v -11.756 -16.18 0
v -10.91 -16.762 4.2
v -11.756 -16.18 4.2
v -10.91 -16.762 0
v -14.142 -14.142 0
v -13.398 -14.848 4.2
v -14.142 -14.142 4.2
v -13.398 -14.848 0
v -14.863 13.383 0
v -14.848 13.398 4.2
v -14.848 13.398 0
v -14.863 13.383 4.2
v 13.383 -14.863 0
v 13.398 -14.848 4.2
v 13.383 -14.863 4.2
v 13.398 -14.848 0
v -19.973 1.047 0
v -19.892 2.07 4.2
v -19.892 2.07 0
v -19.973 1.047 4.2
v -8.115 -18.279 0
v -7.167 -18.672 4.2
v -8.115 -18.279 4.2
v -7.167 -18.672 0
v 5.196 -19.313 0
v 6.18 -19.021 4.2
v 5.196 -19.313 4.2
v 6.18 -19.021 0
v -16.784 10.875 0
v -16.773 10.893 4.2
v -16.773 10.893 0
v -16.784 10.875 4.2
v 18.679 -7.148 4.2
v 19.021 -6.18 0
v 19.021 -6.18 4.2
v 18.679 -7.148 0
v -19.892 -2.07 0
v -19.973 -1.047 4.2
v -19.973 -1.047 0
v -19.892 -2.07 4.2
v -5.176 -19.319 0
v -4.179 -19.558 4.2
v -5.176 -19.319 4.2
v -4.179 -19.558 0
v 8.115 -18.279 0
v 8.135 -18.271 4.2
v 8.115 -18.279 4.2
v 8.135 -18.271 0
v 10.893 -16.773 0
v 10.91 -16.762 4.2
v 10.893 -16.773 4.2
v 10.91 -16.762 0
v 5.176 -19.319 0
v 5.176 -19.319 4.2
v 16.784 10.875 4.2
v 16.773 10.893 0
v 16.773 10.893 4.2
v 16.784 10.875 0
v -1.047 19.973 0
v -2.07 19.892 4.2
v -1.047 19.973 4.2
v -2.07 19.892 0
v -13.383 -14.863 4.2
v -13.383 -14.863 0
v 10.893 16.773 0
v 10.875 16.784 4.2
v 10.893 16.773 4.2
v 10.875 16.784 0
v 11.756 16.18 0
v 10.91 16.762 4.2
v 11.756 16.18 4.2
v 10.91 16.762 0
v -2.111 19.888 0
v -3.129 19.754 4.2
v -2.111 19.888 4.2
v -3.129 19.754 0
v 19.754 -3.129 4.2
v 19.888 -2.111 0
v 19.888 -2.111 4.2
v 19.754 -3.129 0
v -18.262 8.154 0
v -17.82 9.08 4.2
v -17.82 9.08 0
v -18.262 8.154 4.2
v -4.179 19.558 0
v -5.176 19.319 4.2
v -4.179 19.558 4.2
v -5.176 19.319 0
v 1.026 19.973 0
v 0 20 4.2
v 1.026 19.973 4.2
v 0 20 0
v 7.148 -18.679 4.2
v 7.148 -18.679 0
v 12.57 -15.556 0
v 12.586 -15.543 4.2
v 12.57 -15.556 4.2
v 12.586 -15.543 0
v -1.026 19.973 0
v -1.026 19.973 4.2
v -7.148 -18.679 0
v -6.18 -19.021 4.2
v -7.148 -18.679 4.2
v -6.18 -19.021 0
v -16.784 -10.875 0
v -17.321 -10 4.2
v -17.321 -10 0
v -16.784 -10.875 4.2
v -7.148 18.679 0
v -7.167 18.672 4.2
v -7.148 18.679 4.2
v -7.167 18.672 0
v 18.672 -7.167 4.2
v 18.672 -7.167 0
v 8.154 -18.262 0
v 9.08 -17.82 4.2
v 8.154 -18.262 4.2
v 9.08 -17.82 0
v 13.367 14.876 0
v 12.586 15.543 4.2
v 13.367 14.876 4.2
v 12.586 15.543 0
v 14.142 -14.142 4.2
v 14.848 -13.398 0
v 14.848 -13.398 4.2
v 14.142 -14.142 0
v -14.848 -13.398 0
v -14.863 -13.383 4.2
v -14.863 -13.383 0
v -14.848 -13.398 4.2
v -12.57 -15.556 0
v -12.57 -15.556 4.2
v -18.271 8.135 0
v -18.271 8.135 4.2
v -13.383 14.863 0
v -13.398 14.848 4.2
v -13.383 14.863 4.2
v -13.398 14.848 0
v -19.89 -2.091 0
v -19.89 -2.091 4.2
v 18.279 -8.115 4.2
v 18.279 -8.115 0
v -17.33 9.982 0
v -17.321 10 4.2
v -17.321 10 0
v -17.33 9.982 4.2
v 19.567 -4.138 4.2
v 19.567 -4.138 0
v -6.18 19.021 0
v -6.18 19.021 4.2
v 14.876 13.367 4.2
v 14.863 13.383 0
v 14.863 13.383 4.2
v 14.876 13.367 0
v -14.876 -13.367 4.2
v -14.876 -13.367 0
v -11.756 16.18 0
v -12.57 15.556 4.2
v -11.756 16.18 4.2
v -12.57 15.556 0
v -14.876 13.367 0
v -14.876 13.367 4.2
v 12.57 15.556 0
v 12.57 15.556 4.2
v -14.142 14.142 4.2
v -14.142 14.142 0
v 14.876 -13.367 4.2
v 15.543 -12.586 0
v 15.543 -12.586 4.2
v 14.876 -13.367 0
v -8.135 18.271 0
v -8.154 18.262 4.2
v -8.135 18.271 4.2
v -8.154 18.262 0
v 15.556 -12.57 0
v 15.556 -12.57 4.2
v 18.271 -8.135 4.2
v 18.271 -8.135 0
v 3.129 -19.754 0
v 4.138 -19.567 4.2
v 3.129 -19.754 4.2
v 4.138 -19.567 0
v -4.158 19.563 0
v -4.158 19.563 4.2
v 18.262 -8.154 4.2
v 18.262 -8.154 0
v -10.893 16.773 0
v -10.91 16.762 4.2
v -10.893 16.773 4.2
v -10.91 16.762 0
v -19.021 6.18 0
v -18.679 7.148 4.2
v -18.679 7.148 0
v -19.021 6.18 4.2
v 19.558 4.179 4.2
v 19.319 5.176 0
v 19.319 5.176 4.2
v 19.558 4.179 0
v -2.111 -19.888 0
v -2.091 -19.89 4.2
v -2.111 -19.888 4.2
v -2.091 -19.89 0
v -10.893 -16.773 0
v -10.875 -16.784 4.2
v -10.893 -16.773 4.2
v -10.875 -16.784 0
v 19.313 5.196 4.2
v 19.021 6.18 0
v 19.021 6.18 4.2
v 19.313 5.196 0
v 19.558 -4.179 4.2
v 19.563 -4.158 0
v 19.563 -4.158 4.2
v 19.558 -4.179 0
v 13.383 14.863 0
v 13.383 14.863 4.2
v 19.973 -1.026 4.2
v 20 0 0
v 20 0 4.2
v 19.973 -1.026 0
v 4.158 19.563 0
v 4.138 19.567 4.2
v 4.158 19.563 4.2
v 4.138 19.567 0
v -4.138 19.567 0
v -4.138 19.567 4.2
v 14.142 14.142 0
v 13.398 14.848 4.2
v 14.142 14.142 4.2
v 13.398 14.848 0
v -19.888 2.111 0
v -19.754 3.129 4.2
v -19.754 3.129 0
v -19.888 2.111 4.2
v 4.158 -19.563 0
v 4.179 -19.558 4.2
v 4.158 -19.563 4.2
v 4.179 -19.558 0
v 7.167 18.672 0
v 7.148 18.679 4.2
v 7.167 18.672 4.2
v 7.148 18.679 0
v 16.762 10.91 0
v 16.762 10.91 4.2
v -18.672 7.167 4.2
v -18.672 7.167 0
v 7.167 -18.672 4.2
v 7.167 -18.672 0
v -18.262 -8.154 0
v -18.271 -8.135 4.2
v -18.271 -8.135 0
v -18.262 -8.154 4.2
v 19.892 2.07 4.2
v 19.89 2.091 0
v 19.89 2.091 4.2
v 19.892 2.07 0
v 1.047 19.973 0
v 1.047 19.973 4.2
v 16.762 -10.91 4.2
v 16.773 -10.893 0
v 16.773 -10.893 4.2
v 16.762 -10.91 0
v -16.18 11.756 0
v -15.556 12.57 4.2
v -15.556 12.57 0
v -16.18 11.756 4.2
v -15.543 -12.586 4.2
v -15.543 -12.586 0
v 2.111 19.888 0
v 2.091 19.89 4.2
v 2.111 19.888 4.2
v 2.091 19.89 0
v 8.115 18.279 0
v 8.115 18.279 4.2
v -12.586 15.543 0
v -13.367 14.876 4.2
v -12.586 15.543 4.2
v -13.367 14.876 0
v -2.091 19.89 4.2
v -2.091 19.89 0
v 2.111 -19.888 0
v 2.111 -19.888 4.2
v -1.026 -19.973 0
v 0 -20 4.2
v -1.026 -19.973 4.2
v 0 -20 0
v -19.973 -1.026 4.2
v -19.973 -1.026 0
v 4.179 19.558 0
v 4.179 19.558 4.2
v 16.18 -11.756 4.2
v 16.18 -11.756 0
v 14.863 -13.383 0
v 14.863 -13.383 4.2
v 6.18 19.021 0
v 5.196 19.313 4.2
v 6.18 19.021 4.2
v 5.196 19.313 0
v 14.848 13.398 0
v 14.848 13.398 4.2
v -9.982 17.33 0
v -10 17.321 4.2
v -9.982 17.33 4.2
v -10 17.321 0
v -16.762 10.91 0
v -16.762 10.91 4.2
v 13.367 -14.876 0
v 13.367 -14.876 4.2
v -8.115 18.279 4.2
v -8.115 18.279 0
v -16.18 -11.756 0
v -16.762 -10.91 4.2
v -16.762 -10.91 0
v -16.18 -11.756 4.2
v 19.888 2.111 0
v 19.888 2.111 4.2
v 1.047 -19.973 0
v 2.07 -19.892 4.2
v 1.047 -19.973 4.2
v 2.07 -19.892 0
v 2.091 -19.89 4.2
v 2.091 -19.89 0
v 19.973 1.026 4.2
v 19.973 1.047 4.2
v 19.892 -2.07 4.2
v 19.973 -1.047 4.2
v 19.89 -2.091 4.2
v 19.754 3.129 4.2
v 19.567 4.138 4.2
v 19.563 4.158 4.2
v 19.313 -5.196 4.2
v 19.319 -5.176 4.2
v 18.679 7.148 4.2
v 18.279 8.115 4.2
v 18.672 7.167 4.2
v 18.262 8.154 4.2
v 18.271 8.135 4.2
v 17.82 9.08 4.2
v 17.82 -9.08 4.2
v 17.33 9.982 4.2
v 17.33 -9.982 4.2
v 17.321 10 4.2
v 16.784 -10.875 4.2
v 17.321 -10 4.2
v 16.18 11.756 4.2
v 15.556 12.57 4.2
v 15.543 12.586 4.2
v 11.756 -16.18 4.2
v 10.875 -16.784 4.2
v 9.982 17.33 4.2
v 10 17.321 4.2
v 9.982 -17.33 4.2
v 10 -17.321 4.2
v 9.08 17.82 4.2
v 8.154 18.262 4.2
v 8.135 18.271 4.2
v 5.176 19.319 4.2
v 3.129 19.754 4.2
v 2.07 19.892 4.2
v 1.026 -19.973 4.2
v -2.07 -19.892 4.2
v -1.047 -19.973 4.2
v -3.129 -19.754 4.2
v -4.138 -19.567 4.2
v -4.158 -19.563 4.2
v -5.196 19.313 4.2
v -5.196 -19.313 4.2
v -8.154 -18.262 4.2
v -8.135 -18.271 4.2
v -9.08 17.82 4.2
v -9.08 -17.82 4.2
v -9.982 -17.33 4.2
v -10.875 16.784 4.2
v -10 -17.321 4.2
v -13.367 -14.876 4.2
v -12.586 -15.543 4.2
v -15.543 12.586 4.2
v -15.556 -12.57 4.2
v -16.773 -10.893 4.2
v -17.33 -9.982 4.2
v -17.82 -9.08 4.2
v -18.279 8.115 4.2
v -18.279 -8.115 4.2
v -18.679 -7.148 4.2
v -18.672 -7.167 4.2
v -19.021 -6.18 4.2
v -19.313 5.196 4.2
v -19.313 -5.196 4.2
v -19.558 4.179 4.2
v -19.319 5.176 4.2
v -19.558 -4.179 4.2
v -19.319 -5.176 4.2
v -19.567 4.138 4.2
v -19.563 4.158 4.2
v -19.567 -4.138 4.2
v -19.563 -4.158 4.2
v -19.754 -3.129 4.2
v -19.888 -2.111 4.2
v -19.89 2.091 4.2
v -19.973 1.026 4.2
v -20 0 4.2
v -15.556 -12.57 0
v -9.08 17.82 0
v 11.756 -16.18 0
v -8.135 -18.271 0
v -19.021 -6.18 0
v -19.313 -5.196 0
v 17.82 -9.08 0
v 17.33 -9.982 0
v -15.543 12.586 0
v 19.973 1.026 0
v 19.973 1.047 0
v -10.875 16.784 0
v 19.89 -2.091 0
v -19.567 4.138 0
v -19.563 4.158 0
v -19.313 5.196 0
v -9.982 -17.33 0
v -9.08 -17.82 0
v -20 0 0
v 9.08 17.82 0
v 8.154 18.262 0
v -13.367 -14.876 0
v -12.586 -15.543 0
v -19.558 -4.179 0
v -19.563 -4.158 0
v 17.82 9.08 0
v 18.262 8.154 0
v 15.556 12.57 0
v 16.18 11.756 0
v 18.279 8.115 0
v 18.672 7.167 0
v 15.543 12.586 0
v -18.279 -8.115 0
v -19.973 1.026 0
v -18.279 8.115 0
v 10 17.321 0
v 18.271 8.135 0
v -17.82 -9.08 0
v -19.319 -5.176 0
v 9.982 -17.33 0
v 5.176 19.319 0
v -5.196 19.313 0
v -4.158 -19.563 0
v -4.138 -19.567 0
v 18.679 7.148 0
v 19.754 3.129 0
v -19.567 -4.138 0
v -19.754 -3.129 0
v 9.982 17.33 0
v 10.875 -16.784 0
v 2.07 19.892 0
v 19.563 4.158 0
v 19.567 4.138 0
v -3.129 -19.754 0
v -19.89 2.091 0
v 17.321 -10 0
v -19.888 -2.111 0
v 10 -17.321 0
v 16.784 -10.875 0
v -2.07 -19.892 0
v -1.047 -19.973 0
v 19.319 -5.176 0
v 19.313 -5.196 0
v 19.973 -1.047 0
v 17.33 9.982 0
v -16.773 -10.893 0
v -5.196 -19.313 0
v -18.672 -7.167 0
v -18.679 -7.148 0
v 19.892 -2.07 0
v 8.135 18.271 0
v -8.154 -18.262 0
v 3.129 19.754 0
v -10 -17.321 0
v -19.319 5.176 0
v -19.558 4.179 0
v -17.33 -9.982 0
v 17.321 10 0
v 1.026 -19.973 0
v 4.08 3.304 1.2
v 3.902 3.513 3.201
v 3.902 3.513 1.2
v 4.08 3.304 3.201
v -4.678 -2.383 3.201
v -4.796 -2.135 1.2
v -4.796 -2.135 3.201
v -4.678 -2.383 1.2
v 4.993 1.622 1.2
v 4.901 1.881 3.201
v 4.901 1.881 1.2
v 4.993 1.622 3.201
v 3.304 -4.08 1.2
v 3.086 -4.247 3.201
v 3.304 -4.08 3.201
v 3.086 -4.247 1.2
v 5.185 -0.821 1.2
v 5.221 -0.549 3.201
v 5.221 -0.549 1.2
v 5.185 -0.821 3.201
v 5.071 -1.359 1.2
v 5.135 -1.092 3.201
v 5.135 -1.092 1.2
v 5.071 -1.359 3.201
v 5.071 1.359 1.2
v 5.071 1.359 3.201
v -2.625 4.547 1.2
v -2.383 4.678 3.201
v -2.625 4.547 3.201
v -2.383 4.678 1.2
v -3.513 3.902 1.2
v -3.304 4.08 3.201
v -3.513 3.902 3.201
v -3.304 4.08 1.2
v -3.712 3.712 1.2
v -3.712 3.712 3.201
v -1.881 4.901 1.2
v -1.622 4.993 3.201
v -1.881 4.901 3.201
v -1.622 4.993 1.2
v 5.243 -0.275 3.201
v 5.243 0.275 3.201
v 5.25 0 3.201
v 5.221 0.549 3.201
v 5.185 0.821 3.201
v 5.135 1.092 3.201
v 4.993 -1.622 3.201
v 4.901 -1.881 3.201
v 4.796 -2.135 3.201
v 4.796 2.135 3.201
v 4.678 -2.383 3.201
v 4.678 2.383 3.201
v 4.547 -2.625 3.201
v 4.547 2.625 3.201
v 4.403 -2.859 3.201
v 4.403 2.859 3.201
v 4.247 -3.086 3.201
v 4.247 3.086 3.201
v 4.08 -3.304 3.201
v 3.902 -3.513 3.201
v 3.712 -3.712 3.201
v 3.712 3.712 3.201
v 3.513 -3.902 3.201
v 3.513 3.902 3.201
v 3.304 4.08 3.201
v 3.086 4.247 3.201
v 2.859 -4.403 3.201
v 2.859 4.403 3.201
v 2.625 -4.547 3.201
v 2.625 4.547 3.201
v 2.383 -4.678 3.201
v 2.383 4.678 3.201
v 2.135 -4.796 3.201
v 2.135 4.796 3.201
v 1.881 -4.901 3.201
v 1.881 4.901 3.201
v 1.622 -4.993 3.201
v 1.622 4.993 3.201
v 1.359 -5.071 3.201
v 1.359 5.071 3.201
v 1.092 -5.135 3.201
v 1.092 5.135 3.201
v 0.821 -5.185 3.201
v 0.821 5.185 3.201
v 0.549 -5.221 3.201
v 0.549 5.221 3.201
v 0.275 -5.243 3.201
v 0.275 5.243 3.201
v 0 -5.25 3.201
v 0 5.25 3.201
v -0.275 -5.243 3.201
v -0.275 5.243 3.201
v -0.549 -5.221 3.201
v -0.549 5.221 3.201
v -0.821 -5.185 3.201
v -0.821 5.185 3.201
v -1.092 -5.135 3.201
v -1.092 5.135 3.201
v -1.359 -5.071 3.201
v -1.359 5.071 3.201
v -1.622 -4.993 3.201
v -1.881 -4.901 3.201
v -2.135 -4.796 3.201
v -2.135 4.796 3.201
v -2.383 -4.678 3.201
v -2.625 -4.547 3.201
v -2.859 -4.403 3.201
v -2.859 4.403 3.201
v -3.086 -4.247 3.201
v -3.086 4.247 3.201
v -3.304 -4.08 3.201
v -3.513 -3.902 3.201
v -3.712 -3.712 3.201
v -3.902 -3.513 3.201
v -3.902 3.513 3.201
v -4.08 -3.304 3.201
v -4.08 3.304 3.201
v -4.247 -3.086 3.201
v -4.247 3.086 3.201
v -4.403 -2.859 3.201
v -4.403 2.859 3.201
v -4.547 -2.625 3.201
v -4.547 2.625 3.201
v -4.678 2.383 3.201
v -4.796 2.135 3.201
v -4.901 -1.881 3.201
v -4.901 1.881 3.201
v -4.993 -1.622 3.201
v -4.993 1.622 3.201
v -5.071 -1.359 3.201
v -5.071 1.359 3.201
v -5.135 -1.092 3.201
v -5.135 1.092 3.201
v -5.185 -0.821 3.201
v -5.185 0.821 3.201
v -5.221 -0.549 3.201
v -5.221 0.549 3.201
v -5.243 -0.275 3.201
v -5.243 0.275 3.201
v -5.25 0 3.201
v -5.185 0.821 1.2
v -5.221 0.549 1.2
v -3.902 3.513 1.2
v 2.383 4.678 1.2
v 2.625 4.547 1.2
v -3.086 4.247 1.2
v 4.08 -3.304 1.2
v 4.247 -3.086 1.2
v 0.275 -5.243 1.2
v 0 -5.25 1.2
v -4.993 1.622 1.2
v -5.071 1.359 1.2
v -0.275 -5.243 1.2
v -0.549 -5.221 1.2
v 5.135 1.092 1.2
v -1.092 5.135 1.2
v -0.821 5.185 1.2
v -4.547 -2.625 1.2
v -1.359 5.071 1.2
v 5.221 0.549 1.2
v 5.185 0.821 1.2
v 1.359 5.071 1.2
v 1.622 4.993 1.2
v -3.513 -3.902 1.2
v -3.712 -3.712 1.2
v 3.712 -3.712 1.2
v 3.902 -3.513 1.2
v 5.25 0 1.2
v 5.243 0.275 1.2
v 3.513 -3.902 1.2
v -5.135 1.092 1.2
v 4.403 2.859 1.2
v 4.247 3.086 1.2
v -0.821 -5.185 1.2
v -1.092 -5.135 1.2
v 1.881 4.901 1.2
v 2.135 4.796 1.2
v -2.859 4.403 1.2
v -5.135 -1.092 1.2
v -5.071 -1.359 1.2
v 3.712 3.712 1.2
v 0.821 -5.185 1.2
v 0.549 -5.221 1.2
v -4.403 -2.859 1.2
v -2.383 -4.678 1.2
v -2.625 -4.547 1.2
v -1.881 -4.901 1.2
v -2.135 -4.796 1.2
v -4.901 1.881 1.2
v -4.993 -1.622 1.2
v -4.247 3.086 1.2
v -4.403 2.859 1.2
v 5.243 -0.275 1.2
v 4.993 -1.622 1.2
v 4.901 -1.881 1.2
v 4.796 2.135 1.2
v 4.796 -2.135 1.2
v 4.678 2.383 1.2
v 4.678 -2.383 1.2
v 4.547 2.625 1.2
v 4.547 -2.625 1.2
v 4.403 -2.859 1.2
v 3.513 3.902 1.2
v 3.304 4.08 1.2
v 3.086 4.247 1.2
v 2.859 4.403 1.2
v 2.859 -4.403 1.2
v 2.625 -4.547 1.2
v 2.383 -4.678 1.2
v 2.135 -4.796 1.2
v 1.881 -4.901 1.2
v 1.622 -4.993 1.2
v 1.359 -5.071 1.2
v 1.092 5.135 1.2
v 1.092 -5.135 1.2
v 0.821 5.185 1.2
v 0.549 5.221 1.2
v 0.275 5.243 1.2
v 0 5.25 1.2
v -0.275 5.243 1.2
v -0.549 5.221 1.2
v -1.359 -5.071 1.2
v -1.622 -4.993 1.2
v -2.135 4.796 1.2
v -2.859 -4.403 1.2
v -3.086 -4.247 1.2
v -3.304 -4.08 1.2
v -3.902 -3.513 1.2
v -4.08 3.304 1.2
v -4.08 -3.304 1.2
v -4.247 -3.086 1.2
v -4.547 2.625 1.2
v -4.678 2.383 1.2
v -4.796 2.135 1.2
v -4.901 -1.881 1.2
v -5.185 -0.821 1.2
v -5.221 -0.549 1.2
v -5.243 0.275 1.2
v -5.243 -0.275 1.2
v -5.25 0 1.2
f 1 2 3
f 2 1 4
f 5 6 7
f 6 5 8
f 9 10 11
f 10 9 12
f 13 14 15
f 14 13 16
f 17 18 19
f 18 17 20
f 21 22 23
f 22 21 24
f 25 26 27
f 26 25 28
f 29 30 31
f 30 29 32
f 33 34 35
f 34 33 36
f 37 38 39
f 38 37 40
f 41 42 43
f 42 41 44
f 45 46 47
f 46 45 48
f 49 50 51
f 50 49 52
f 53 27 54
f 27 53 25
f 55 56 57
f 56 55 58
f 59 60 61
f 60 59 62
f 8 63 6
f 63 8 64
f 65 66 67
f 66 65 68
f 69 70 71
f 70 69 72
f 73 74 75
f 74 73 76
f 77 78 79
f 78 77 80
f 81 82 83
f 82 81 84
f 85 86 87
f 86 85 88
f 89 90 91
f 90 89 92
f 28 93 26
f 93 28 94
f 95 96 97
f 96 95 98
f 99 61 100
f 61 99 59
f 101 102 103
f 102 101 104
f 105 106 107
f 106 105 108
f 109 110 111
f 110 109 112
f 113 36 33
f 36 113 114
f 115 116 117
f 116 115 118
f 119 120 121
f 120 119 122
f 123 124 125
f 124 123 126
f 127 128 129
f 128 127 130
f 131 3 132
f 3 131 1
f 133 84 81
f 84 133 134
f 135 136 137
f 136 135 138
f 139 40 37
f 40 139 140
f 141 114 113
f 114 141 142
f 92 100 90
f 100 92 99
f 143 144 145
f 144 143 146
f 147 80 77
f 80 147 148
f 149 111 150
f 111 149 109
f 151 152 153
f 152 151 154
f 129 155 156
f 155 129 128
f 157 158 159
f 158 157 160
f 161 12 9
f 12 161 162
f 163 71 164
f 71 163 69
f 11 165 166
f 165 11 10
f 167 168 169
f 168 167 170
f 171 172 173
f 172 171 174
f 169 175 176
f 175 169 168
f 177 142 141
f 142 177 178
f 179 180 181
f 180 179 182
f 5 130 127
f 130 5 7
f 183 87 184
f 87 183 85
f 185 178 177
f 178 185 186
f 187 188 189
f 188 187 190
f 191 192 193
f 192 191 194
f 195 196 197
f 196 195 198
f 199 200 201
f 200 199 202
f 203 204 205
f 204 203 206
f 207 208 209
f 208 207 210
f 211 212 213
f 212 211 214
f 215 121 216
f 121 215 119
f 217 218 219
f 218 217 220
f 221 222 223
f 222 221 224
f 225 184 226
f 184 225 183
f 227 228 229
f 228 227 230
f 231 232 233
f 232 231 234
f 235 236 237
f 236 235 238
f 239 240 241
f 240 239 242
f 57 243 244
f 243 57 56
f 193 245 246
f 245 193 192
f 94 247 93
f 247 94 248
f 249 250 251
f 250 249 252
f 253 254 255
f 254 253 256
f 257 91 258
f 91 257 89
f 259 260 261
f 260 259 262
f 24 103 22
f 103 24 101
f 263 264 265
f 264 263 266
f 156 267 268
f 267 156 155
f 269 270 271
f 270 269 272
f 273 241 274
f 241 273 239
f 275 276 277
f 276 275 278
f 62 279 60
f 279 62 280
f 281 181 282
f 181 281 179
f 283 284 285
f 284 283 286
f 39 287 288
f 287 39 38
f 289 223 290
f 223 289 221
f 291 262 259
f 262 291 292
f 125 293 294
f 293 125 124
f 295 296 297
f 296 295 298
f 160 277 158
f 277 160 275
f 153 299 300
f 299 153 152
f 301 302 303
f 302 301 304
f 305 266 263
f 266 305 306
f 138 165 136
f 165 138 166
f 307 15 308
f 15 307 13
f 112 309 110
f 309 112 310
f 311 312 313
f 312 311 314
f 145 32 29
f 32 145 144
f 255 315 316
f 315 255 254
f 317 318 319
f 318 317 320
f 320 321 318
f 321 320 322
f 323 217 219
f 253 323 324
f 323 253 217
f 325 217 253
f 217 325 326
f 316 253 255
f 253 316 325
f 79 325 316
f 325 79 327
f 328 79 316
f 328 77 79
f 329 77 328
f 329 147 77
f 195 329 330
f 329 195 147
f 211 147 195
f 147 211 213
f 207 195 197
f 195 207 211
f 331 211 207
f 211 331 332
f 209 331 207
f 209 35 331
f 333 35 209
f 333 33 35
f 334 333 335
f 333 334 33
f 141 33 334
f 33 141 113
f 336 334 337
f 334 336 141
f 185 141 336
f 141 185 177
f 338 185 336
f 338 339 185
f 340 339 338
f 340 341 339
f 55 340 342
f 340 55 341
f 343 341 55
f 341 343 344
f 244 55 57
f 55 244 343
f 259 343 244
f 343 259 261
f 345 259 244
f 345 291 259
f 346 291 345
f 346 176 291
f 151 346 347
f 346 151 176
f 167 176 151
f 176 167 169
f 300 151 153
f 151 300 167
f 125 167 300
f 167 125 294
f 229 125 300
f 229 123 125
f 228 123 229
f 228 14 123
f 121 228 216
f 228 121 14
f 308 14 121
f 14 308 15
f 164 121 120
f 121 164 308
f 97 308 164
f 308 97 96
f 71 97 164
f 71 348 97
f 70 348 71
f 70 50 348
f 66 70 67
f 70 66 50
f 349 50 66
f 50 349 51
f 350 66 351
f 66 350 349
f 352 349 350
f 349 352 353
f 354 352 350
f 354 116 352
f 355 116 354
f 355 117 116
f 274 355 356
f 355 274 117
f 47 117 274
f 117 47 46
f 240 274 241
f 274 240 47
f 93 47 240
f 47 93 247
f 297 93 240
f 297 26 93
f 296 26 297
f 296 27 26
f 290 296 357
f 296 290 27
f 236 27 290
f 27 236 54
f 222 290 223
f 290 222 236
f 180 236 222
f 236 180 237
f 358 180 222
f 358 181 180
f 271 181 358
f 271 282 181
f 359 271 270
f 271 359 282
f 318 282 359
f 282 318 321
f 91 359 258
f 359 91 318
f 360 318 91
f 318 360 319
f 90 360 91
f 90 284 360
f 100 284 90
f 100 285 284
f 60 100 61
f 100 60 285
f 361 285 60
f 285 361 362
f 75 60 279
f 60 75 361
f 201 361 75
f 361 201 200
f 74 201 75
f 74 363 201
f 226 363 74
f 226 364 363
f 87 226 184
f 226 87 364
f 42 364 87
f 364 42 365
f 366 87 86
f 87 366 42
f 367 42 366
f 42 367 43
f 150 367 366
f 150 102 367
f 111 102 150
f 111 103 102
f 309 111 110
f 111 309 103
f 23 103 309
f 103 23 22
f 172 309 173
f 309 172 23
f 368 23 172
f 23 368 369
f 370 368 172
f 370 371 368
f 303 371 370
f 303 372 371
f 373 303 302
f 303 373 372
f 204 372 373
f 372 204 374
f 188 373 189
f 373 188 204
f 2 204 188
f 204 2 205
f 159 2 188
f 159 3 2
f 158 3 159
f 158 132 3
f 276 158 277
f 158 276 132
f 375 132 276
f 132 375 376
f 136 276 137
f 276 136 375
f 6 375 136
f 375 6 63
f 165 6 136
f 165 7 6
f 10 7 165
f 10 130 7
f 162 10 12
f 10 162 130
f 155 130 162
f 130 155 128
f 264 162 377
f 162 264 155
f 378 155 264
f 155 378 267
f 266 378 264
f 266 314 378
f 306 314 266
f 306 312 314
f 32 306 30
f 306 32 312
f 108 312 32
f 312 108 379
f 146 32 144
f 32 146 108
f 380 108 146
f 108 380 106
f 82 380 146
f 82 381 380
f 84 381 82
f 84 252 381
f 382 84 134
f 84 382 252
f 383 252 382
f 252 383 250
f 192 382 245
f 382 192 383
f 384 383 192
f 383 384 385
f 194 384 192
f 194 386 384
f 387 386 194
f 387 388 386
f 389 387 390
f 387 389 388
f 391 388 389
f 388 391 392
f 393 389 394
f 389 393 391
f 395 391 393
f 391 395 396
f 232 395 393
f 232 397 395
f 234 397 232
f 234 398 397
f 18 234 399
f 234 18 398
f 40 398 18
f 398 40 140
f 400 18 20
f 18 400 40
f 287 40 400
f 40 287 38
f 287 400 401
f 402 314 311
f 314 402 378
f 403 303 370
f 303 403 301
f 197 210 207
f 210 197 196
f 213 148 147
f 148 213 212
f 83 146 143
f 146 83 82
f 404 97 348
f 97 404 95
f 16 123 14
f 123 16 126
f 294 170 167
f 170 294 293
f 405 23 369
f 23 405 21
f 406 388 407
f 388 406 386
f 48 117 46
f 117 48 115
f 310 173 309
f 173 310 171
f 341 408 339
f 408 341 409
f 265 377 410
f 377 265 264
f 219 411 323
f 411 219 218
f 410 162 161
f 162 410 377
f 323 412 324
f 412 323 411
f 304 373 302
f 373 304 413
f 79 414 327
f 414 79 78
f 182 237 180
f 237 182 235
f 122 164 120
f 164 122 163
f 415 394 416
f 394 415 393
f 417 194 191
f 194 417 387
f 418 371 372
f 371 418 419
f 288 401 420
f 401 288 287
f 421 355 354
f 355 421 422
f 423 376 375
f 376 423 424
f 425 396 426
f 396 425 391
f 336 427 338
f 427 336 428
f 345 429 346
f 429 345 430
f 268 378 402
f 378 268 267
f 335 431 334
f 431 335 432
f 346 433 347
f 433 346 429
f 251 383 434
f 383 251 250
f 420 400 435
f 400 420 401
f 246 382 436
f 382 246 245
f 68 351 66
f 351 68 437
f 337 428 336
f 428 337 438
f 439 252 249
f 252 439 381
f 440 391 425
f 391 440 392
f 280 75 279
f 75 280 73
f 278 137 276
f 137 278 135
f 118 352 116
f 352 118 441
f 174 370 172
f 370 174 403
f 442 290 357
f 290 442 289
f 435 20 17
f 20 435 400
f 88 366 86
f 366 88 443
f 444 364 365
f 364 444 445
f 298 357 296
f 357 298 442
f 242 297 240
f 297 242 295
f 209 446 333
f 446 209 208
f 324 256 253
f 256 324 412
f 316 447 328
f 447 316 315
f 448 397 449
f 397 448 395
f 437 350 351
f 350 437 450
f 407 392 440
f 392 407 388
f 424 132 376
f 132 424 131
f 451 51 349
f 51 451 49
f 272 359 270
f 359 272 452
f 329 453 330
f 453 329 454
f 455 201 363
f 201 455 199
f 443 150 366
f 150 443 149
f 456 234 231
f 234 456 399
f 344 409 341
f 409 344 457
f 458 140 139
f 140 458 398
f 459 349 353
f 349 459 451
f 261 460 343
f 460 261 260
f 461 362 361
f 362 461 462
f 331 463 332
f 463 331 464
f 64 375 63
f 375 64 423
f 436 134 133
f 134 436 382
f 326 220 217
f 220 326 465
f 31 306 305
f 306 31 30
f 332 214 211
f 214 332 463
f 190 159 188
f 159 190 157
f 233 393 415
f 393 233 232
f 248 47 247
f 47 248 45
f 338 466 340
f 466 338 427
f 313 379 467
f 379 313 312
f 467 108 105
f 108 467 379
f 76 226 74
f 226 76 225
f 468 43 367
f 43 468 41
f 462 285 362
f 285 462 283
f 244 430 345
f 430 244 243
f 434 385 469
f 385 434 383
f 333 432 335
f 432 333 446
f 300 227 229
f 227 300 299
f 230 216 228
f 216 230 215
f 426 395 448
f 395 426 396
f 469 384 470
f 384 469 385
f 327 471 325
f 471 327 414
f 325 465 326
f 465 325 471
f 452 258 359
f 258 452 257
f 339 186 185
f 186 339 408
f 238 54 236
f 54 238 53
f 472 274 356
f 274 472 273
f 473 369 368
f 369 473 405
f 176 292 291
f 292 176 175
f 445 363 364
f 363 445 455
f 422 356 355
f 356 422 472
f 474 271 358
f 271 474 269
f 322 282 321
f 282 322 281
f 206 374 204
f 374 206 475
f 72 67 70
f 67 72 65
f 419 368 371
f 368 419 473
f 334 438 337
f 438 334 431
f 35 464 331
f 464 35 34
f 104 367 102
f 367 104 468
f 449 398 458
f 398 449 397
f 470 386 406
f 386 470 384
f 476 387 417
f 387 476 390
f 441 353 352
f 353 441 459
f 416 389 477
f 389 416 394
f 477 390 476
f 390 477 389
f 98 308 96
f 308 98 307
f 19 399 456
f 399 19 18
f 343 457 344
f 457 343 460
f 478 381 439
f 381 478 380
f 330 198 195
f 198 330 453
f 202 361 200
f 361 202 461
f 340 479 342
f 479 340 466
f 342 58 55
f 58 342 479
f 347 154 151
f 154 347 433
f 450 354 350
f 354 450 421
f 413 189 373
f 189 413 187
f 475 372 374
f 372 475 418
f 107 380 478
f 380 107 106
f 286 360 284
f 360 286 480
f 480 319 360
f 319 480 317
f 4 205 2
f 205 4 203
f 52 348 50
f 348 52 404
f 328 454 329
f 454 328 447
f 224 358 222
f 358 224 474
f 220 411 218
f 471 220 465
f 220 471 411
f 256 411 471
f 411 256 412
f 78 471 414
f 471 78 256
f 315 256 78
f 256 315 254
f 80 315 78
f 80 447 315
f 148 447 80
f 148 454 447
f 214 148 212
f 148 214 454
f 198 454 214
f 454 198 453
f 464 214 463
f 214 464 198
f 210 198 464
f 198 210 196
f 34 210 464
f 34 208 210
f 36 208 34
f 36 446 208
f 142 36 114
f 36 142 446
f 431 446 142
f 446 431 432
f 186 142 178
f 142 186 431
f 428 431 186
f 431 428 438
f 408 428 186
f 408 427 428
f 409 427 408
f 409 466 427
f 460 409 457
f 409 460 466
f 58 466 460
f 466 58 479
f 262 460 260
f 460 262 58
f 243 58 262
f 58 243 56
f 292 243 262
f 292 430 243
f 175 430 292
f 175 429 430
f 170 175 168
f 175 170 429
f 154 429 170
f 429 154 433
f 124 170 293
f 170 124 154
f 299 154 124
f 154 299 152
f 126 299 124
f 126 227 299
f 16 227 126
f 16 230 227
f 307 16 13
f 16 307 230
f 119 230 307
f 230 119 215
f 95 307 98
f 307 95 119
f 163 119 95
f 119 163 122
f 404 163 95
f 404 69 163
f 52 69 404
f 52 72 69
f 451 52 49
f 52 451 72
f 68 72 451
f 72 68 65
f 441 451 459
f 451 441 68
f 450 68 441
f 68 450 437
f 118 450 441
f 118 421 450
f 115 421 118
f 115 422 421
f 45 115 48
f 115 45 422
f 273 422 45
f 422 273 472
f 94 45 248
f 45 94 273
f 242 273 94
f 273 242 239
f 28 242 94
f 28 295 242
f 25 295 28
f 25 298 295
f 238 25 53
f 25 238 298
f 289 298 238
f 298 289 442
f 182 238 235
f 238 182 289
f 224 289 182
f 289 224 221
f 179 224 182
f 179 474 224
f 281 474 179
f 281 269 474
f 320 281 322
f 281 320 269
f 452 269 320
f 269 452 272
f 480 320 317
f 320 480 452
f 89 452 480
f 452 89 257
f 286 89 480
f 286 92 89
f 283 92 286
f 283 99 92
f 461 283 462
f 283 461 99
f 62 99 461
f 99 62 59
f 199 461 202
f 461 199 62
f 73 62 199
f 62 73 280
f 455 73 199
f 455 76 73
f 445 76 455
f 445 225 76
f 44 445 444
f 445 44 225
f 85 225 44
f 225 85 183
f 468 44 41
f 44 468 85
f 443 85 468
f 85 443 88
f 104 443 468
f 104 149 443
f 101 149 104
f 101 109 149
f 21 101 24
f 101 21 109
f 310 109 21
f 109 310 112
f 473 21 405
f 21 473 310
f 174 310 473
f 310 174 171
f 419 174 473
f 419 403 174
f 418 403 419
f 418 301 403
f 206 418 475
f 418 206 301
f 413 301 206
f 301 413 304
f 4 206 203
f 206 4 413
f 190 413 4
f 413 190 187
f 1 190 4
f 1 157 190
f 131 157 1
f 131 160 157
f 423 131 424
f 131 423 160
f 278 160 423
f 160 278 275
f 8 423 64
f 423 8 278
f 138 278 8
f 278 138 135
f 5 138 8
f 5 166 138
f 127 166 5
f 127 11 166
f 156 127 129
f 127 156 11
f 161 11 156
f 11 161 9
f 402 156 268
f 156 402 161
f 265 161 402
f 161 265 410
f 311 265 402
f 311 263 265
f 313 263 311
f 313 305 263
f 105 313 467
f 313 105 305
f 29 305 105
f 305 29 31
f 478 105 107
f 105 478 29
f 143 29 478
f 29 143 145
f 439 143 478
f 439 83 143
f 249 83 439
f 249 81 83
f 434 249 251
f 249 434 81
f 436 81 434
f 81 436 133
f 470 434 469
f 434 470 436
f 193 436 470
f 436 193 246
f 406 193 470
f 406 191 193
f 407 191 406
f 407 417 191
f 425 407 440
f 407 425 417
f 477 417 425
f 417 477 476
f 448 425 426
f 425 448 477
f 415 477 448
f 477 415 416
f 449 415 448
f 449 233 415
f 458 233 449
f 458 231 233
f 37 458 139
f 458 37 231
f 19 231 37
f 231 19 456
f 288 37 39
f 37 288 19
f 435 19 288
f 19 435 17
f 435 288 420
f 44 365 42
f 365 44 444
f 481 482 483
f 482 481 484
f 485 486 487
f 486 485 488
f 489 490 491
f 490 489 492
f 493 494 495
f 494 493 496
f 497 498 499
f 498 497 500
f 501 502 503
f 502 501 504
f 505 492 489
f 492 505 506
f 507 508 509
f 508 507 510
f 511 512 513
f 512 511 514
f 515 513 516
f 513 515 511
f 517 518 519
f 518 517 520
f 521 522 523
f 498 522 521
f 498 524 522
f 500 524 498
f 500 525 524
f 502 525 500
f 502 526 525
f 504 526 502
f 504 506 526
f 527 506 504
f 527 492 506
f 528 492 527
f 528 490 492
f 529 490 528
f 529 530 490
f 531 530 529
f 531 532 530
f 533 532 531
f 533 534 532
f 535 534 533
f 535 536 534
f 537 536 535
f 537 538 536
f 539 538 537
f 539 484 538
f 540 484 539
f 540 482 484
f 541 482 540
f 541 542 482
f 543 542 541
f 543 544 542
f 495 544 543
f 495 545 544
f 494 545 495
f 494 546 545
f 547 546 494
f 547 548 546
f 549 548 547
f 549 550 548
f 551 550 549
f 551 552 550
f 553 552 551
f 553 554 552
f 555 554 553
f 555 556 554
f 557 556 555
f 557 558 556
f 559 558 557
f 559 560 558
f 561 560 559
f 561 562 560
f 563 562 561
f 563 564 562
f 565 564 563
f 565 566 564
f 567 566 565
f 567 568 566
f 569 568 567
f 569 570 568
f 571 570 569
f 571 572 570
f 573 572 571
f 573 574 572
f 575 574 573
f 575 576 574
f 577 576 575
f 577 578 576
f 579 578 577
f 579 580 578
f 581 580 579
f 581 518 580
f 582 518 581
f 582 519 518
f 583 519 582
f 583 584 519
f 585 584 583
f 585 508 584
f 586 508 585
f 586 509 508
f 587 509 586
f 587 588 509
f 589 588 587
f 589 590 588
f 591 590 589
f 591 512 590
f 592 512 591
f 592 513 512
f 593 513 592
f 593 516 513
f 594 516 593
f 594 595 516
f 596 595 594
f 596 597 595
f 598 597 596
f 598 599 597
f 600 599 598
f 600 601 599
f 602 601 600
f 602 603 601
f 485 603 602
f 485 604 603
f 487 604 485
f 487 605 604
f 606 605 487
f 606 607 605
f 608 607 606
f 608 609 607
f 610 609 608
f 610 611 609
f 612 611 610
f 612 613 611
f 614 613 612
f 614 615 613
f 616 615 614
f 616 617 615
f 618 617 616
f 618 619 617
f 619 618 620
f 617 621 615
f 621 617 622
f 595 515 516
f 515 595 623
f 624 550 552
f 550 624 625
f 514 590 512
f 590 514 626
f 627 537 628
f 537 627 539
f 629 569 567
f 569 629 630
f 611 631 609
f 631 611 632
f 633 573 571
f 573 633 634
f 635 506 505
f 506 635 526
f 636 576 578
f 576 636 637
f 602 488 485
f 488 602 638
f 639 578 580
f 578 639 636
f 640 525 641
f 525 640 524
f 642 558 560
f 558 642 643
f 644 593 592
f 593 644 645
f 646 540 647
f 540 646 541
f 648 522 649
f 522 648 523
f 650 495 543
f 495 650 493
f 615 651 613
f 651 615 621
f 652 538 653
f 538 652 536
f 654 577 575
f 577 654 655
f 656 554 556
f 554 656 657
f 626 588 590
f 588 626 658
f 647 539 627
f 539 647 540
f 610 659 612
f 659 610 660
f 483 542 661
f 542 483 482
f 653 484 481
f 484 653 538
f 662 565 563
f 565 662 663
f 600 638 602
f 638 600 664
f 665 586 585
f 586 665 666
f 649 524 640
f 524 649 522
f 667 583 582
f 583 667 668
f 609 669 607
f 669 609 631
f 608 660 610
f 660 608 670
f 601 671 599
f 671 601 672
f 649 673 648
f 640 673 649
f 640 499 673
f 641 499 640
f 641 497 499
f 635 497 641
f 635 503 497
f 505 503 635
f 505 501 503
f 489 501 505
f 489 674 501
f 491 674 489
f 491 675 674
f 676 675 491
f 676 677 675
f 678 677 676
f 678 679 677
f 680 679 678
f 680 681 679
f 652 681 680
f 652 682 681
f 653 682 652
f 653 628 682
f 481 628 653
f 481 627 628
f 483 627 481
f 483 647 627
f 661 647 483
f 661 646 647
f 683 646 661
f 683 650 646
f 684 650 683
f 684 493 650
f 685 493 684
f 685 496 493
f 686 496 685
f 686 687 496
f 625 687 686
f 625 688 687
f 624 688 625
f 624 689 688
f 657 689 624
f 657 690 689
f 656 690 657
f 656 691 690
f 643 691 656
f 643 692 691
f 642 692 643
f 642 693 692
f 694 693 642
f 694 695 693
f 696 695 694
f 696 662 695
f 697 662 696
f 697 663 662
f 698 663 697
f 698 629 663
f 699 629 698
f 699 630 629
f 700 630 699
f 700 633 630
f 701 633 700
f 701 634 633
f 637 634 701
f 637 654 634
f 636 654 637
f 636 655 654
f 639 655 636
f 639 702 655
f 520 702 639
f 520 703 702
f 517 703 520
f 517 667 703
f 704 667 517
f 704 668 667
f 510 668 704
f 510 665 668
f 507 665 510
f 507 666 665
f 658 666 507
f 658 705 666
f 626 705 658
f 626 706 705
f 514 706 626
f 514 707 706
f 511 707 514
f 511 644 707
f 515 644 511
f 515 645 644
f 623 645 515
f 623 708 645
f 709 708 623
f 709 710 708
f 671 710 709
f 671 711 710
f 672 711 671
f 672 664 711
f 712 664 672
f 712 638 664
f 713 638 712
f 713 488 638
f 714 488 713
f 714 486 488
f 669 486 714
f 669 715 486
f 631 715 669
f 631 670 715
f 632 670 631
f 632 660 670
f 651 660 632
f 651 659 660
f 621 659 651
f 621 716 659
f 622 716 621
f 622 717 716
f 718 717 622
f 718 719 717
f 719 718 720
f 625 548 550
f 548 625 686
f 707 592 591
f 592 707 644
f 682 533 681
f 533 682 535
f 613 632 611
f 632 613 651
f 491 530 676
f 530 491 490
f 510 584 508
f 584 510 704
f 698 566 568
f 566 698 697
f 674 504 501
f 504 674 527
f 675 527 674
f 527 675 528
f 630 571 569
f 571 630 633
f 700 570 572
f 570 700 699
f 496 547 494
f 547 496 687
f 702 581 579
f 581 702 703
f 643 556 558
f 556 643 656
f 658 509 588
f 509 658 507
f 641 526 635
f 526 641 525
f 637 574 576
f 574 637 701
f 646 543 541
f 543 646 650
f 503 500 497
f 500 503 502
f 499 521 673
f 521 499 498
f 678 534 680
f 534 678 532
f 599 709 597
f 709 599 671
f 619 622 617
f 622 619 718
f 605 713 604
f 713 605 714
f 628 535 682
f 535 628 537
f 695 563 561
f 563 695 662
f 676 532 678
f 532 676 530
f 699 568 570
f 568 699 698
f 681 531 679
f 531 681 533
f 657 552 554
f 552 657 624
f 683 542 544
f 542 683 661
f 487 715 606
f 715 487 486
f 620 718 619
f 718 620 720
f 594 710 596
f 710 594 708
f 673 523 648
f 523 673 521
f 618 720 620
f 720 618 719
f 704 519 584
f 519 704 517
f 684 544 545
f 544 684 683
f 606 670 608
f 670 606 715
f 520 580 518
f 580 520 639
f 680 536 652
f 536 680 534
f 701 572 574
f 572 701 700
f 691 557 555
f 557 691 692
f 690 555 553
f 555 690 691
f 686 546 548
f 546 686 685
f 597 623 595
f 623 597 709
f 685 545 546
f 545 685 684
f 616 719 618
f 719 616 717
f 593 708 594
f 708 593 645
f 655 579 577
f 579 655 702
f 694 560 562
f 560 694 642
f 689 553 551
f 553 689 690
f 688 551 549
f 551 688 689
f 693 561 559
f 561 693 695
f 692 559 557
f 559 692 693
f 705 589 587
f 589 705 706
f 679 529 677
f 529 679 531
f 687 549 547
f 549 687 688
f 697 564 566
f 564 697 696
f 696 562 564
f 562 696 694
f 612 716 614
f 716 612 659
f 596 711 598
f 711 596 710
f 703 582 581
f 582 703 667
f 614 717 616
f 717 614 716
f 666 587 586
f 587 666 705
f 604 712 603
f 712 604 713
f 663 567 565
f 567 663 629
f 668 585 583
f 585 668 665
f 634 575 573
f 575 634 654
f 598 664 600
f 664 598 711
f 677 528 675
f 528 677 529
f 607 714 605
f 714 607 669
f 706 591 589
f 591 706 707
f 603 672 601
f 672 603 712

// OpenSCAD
/*
  Magnet-Token with Encapsulated Pocket (for pause-and-drop)
  - Print base up to pocket top, pause, drop magnet, resume to encapsulate.
  - Defaults for 10x2 mm magnet; adjust params to match.
*/

// === Parameters ===
token_d     = 40;     // mm outer diameter
base_t      = 1.2;    // mm base thickness under magnet
magnet_d    = 10.0;   // mm magnet diameter
magnet_t    = 2.0;    // mm magnet thickness
cover_t     = 1.0;    // mm printed cover over magnet (>= 3 layers @ 0.32 for 0.5 nozzle; adjust)
clearance   = 0.25;   // radial clearance for pocket (diameter grows by 2*clearance)
chamfer_t   = 0.4;    // small top edge break
$fn = 120;

// Derived
token_h = base_t + magnet_t + cover_t;
pocket_r = (magnet_d/2) + clearance;

// Model: cylinder minus a cylindrical pocket from z=base_t to z=base_t+magnet_t
module token(){
  difference(){
    // main body with a light top chamfer
    minkowski(){
      cylinder(h=token_h - chamfer_t, r=token_d/2 - chamfer_t);
      cylinder(h=chamfer_t, r=chamfer_t);
    }
    // pocket void (centered)
    translate([0,0,base_t])
      cylinder(h=magnet_t + 0.001, r=pocket_r);
  }
}

token();

// Print-time notes:
// - Pause at layer where Z >= base_t + magnet_t (e.g., Z_pause = base_t + magnet_t).
// - Ensure magnet sits fully below that Z before resuming so nozzle won't strike it.
